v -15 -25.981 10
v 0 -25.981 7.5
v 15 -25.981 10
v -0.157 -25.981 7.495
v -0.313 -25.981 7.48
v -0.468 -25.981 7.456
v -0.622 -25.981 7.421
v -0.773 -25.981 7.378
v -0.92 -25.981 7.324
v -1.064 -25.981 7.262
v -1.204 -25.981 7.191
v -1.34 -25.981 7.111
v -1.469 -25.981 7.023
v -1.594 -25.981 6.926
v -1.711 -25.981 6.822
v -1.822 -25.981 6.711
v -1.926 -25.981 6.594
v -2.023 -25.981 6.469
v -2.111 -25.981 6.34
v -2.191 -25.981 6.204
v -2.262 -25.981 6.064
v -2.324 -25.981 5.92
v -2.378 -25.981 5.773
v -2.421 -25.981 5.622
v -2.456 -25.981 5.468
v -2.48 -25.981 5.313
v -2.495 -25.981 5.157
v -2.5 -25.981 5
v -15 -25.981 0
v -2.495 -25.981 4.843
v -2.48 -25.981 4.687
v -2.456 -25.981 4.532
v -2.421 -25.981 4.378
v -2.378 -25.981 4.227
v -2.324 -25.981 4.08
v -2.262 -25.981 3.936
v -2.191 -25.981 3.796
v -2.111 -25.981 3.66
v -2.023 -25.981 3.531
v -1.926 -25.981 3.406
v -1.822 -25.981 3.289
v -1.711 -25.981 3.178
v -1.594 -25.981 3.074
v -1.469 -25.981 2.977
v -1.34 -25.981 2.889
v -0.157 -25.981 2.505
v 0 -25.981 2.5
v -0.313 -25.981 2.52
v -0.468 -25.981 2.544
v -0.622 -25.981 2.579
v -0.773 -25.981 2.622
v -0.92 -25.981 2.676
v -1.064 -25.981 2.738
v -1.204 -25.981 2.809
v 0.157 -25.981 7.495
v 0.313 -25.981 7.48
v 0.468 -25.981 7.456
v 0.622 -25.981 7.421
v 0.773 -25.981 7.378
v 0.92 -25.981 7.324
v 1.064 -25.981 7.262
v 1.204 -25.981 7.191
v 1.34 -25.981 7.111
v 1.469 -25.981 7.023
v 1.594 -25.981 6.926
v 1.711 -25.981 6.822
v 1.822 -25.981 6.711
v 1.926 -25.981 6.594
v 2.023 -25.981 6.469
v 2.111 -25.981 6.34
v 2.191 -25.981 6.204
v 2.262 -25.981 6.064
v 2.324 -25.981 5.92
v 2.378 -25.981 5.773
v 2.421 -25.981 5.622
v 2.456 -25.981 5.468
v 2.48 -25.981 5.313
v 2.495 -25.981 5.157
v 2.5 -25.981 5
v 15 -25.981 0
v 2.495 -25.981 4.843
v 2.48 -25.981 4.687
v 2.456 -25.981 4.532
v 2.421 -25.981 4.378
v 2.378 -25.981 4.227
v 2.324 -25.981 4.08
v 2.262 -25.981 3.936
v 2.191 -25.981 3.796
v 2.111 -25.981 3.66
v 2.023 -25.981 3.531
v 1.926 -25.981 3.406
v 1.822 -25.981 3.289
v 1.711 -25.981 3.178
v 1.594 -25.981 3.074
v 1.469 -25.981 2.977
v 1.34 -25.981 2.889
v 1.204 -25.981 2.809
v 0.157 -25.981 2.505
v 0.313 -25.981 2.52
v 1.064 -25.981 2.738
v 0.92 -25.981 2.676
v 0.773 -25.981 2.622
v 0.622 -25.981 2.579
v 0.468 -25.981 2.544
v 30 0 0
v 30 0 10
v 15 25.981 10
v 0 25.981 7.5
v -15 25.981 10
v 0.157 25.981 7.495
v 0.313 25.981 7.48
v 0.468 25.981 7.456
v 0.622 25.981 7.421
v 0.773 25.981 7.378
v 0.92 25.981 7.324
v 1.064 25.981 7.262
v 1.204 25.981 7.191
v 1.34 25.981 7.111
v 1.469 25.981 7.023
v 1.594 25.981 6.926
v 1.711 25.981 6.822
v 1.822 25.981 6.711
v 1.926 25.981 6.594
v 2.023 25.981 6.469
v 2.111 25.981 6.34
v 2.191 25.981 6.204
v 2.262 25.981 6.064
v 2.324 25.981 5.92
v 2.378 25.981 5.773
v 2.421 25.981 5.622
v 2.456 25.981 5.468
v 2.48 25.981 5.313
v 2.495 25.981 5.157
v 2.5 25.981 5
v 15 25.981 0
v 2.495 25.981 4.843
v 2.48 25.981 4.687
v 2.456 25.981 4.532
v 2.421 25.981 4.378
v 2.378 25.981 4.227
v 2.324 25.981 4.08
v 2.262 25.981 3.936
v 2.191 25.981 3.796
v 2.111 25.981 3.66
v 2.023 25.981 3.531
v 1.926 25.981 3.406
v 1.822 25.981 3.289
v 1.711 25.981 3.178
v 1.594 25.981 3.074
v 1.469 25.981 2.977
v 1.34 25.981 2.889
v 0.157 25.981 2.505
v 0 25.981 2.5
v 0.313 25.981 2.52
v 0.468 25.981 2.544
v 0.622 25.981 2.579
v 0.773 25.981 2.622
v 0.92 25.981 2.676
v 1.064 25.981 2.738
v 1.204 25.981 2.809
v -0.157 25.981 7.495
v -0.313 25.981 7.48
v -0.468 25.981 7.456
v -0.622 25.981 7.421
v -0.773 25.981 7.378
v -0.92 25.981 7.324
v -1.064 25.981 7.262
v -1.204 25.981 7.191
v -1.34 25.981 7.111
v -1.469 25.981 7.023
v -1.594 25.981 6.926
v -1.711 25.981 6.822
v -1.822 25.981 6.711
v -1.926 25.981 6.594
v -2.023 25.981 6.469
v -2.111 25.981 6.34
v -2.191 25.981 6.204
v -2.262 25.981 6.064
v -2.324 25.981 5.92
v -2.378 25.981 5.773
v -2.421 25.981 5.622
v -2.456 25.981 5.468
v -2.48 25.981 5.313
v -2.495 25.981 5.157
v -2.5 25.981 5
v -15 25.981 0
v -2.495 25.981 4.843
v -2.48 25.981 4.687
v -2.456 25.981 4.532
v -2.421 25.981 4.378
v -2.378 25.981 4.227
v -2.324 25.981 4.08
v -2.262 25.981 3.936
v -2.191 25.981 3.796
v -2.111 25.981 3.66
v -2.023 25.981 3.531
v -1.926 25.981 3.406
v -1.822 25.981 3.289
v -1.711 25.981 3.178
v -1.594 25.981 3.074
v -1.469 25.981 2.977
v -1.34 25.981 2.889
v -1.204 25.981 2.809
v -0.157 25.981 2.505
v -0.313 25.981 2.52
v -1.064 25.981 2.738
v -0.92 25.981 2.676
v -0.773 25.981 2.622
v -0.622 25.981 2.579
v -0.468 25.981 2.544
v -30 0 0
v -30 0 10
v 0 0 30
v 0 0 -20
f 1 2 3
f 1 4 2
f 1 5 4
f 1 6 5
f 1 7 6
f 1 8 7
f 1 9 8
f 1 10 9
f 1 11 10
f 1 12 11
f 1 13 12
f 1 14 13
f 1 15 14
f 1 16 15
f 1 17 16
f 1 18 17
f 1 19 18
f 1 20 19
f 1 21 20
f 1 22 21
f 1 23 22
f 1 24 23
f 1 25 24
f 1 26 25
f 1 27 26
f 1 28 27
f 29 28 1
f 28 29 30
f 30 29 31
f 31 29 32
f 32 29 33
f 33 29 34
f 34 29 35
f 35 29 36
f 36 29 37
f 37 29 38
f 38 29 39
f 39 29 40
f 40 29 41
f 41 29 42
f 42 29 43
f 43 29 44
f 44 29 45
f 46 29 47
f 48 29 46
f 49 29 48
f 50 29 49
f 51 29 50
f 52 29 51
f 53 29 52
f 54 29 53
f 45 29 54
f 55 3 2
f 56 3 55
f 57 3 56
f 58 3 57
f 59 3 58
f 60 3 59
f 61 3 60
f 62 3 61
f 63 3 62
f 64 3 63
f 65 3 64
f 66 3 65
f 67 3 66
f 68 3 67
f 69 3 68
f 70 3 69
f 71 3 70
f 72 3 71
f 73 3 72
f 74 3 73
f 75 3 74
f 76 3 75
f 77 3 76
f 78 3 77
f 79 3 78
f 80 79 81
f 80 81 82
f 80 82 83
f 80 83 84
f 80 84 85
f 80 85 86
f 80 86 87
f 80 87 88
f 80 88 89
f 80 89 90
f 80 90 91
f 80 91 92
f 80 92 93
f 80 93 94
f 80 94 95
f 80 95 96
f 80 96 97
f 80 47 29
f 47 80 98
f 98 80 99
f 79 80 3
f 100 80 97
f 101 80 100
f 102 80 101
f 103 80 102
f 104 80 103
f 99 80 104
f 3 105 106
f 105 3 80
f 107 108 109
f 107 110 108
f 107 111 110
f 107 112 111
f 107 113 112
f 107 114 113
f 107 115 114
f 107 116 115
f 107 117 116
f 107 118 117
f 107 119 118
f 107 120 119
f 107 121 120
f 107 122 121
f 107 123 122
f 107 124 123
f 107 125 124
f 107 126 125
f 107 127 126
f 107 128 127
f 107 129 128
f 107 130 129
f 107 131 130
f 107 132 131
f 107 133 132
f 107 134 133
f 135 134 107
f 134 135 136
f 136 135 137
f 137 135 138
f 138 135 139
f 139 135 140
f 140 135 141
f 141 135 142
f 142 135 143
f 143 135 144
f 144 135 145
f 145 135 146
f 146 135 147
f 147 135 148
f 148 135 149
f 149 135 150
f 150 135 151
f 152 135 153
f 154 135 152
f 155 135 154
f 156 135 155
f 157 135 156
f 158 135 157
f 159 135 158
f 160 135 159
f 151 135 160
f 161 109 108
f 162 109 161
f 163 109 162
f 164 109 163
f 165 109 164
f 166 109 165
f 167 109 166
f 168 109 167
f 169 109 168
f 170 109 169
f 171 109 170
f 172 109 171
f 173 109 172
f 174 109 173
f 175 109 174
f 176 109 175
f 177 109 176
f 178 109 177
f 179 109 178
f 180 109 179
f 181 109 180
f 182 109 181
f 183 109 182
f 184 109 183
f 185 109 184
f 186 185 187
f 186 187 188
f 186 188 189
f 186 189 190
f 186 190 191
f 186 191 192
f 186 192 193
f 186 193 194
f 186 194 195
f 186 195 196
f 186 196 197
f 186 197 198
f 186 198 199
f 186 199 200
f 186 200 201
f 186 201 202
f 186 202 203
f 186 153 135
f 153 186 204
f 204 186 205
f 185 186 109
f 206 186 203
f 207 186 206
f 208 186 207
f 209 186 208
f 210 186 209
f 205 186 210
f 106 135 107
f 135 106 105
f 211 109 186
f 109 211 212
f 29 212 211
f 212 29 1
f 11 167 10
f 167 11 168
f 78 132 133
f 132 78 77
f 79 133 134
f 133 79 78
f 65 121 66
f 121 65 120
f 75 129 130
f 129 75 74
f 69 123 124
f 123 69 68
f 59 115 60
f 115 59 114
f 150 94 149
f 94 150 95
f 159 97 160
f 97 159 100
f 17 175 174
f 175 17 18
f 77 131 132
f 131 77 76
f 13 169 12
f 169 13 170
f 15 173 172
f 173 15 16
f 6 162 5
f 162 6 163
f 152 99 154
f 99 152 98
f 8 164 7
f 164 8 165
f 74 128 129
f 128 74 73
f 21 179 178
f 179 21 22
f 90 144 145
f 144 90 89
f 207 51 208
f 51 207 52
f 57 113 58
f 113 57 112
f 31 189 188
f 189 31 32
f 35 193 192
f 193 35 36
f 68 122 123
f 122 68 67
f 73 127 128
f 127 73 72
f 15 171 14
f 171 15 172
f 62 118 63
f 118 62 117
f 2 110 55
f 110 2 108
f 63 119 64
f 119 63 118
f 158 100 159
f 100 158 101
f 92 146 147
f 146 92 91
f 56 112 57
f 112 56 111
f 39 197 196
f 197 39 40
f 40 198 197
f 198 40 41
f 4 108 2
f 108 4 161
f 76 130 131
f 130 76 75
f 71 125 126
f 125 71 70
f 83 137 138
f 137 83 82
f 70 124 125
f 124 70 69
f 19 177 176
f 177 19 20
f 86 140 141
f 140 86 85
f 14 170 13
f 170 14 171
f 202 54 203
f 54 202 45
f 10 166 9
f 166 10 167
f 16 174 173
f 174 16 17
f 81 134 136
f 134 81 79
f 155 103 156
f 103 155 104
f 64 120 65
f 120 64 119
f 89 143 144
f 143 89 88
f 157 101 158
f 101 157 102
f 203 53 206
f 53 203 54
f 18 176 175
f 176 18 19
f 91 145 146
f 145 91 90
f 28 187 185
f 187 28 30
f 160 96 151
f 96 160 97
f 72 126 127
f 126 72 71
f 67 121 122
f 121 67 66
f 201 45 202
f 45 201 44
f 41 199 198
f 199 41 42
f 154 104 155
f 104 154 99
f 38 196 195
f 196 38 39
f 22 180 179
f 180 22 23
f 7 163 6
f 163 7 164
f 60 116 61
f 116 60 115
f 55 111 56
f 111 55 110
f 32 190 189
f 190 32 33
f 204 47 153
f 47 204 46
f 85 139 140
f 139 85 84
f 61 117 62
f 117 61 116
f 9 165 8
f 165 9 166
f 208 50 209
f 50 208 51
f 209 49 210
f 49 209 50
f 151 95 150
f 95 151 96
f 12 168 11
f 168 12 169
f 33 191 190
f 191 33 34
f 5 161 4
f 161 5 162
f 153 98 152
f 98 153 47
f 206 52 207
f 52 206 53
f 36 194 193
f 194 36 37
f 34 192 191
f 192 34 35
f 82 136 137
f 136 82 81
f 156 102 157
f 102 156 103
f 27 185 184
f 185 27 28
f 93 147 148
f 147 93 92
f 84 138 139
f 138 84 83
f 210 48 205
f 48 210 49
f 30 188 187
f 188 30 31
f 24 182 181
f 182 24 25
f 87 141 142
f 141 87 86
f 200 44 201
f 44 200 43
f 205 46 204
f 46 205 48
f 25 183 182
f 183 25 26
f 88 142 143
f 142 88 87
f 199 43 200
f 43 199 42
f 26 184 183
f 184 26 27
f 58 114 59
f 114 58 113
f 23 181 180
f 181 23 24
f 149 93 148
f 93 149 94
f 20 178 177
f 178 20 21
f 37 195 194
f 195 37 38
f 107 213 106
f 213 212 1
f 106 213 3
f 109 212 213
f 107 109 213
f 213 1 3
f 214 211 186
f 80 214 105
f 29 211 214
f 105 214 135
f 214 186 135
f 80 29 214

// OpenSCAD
//parameters
radius=30;
side=6;
height=10;

//commands

translate([0, 0, height])
 cylinder(h=20, r1=radius, r2=0, $fn=side, center=false);
 
rotate(a=[0, 180, 0])
 cylinder(h=20, r1=radius, r2=0, $fn=side, center=false);

difference(){
 cylinder(h=height, r1=radius, r2=radius, $fn=side, center=false);
translate([0,0, height/2])
rotate(a=[90,0, 0]) 
    cylinder(h=60, r1=2.5, r2=2.5, $fn=100, center=true);
}
